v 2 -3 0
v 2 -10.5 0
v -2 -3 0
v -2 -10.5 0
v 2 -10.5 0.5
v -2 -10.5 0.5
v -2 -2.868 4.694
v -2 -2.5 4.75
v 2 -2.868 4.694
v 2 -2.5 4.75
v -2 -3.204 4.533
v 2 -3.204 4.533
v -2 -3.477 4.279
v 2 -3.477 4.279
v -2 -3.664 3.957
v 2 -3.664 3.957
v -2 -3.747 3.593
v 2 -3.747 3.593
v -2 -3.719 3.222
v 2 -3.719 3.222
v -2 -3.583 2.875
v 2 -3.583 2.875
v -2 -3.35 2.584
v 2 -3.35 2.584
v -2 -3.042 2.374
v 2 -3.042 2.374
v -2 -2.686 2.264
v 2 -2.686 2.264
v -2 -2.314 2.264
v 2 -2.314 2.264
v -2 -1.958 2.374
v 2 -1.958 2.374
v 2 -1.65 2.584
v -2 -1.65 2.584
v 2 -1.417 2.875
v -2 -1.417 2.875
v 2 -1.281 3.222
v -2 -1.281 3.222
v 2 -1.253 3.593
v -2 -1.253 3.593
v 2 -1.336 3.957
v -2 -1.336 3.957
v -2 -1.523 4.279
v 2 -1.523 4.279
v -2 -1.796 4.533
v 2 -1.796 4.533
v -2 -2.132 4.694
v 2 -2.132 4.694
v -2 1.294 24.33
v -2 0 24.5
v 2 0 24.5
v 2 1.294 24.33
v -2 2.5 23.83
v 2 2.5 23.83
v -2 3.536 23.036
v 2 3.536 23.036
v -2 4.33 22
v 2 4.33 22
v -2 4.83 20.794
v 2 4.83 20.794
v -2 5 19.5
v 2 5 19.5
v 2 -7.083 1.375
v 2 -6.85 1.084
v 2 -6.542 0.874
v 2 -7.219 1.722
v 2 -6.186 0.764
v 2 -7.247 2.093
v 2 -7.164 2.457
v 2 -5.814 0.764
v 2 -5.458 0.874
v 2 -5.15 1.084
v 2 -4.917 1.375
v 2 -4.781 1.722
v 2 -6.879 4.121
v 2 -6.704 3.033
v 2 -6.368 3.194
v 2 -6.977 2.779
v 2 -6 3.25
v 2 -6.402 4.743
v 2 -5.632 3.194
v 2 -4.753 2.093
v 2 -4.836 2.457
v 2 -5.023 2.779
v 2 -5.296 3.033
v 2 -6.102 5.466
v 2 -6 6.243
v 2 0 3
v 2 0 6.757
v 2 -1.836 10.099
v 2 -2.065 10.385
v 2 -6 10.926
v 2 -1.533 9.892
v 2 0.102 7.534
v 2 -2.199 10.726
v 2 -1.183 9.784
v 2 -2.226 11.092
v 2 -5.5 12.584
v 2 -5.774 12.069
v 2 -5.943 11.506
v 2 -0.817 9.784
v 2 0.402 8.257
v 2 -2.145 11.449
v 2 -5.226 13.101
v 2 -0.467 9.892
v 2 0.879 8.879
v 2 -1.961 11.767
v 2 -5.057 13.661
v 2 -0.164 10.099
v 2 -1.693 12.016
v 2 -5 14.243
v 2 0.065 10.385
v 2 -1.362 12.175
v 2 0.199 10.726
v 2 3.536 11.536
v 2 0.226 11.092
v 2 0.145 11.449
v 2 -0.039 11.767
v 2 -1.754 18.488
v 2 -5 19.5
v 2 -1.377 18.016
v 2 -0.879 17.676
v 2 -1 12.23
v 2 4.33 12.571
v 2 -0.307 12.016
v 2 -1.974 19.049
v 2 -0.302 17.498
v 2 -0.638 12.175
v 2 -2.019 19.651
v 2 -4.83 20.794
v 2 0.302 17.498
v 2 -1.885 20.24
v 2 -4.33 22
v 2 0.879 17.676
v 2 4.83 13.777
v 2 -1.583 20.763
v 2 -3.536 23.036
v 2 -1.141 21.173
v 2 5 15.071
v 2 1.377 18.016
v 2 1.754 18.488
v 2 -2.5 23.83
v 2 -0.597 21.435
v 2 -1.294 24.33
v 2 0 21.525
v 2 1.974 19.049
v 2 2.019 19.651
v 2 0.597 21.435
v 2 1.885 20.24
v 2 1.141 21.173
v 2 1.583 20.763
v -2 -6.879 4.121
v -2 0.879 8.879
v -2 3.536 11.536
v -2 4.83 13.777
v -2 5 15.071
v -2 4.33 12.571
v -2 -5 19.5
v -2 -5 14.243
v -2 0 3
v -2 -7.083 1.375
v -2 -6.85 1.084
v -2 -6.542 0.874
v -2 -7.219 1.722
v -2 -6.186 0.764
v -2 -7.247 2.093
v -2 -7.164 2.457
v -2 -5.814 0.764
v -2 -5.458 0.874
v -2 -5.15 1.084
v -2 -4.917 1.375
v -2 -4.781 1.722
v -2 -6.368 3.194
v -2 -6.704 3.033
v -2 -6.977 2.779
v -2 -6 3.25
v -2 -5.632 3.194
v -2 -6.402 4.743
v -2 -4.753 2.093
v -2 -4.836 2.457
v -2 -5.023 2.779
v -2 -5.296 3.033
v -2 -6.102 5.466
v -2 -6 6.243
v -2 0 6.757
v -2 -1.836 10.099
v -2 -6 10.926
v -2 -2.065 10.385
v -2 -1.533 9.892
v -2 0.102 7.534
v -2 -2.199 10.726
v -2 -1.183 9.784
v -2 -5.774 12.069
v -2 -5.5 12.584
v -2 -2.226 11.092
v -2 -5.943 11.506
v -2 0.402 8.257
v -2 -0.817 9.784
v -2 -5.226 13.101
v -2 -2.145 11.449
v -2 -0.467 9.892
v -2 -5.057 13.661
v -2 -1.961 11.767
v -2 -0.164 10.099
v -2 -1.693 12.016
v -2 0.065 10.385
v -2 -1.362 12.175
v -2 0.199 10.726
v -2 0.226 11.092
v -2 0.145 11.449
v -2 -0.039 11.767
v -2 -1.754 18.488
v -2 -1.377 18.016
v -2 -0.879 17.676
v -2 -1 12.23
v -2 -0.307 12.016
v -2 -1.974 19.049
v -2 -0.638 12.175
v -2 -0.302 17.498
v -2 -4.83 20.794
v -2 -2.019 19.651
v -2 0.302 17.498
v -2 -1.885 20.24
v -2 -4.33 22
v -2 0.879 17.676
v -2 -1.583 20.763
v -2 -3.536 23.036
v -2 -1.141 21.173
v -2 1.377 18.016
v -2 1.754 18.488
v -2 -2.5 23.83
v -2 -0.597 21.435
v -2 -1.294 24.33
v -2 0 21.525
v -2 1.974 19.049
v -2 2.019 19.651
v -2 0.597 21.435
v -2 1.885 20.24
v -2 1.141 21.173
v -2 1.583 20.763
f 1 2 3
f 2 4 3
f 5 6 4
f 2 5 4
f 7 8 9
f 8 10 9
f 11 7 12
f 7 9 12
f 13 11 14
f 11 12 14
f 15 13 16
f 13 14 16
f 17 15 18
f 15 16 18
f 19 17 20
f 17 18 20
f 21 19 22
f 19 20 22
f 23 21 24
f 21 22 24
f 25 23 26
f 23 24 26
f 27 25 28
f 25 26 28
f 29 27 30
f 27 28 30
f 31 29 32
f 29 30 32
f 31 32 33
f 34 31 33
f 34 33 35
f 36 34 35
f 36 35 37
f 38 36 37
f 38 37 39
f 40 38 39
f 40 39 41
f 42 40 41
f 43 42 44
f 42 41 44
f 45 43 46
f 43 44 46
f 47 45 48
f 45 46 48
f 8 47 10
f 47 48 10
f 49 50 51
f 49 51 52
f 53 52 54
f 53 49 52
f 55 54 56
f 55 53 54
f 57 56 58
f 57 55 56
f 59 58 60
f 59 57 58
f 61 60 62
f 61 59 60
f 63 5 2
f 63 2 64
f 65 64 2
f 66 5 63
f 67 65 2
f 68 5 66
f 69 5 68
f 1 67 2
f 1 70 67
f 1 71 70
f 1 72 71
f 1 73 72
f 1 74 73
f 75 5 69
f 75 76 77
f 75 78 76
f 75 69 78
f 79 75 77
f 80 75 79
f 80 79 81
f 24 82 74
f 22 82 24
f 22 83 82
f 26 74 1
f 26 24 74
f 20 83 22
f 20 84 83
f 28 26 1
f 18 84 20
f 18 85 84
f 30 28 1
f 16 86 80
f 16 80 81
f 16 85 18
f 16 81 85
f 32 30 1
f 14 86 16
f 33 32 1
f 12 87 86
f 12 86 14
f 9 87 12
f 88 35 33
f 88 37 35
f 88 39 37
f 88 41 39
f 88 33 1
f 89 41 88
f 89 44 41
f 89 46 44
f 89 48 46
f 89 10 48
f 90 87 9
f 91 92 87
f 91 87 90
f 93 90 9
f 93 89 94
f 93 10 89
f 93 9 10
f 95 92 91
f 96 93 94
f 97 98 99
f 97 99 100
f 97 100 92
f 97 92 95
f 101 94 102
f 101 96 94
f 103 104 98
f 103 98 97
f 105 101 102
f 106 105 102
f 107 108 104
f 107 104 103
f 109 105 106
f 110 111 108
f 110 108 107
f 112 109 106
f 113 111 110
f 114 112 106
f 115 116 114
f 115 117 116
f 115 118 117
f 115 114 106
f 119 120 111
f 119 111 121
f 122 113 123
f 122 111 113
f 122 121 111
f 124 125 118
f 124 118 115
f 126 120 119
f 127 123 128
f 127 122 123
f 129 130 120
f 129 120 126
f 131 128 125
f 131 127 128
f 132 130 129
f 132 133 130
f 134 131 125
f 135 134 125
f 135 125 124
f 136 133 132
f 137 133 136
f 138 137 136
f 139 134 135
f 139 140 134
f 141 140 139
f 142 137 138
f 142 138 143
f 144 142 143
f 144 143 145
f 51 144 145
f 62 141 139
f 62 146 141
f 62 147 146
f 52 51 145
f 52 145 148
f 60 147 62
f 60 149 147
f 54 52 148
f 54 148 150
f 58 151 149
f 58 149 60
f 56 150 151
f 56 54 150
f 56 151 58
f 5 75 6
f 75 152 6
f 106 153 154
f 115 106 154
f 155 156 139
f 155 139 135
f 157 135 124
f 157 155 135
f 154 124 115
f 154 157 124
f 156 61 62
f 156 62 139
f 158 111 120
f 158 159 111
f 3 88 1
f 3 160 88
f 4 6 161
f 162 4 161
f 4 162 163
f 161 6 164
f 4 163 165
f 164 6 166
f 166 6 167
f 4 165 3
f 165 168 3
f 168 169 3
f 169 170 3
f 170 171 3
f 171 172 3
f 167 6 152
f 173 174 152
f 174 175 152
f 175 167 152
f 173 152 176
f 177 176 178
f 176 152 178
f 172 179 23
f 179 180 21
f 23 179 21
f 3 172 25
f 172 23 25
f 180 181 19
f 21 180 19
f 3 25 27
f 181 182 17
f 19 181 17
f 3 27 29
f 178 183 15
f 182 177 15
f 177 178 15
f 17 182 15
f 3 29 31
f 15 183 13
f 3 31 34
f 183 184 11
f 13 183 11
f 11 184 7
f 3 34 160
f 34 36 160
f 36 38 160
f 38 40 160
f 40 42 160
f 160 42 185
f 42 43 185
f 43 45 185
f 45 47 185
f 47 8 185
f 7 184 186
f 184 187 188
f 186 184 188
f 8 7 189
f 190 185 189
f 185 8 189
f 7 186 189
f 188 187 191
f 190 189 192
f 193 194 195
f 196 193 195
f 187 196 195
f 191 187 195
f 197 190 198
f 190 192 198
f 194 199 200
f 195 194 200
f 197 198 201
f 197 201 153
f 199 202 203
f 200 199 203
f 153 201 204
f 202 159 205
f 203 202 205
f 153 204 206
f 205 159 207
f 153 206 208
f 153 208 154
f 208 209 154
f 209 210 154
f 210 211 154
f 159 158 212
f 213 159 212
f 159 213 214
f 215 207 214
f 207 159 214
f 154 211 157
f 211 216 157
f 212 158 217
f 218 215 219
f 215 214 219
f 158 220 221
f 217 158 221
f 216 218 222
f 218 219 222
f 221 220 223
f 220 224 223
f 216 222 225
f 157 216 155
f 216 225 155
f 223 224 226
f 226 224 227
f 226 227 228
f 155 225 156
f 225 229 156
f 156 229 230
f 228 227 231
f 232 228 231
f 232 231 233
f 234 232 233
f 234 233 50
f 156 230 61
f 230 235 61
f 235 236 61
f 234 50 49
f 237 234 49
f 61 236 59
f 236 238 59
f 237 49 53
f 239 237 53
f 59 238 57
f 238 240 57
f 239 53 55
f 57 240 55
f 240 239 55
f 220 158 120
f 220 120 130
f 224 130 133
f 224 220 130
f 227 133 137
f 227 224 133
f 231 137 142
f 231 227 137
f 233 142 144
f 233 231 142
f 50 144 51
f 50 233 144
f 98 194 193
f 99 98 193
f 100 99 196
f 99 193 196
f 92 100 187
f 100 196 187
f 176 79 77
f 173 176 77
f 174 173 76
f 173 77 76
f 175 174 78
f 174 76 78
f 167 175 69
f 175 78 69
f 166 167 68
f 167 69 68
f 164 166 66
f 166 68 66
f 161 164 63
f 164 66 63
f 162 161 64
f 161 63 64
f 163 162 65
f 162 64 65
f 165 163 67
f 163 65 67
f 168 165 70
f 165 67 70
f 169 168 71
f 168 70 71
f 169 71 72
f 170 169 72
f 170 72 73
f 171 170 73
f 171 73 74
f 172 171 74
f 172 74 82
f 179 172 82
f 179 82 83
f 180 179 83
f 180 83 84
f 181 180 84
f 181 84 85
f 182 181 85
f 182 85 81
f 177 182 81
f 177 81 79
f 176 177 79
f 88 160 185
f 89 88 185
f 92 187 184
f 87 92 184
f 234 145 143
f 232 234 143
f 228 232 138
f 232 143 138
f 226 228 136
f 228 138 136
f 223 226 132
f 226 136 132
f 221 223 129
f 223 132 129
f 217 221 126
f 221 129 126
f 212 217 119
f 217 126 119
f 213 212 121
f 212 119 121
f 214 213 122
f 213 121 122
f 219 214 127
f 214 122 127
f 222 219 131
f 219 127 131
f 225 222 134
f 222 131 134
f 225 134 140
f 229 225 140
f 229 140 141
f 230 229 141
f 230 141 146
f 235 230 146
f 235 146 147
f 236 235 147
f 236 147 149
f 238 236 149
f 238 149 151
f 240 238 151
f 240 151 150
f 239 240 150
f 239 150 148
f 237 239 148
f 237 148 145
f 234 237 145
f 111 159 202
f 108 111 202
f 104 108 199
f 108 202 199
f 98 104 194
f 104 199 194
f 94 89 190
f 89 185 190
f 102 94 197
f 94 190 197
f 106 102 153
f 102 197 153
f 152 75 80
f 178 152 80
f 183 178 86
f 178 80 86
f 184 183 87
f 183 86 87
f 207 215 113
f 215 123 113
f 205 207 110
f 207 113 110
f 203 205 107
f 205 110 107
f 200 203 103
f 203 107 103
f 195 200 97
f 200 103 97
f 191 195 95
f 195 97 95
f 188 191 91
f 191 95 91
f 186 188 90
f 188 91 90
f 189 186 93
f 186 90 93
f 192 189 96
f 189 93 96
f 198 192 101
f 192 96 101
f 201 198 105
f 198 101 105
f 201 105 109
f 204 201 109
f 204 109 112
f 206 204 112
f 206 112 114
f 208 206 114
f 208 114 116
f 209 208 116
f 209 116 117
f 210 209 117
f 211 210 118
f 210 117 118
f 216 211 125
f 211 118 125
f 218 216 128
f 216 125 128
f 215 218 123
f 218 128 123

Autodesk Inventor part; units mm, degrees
ref_plane "YZ Plane" through (0, 0, 0) normal (1, 0, 0) x (0, 1, 0)
ref_plane "XZ Plane" through (0, 0, 0) normal (0, 1, 0) x (-1, 0, 0)
ref_plane "XY Plane" through (0, 0, 0) normal (0, 0, 1) x (1, 0, 0)
sketch "Skizze1" plane through (0, 0, 0) normal (1, 0, 0) x (0, 1, 0)
  line L0 (-6, 5) -> (-10.5, 0.5)
  line L1 (-10.5, 0) -> (-3, 0)
  line L2 (0, 3) -> (0, 8)
  line L3 (-10.5, 0.5) -> (-10.5, 0)
  line L4 (0, 8) -> (5, 13)
  line L5 (0, 8) -> (0, 19.5) construction
  circle A0 centre (0, 19.5) radius 0.5
  line L6 (-5, 13) -> (-5, 24.5)
  line L7 (-5, 24.5) -> (5, 24.5)
  line L8 (5, 24.5) -> (5, 13)
  line L9 (0, 3) -> (-3, 0)
  line L10 (-5, 13) -> (-6, 12)
  line L11 (-6, 12) -> (-6, 5)
  line L12 (5, 13) -> (-5, 13) construction
  point P0 (0, 0)
  point P1 (0, 0)
  dimension "d67" = 0.5
  dimension "d68" = 10.5
  dimension "d69" = 1
  dimension "d70" = 5
  dimension "d71" = 19.5
  dimension "d72" = 10
  dimension "d73" = 45
  dimension "d74" = 8
  dimension "d75" = 3
  dimension "d76" = 45
  dimension "d77" = 1
extrude "Extrusion1" add sketch "Skizze1" along normal mid plane 4
sketch "Skizze3" plane through (-2, 0, 0) normal (-1, 0, 0) x (0, 0, 1)
  line L0 (0, 8.1) -> (0, -13.6) projected
  circle A0 centre (19.5, 0) radius 0.5 projected
hole "Bohrung1" at (-2, 0, 19.5) direction (1, 0, 0) diameter 4.05 end through all
sketch "Skizze4" plane through (-2, 0, 0) normal (-1, 0, 0) x (0, 0, 1)
  line L0 (-4.9, 0) -> (29.4, 0) projected
  line L1 (0, 8.1) -> (0, -13.6) projected
  point P0 (11, -1)
  dimension "d36" = 1
  dimension "d37" = 11
hole "Bohrung2" at (-2, -1, 11) direction (1, 0, 0) diameter 2.459 end through all thread size "M3x0.5" class "6H" standard "ISO Metric profile"
fillet "Rundung2" radius 5 3 edges at (0, 5, 24.5) (0, -5, 24.5) (0, 5, 13)
fillet "Rundung4" radius 3 4 edges at (0, -5, 13) (0, -6, 12) (0, 0, 8) (0, -6, 5)
sketch "Skizze5" plane through (-2, 0, 0) normal (-1, 0, 0) x (0, 0, 1)
  line L0 (-4.9, 0) -> (29.4, 0) projected
  line L1 (0, 8.1) -> (0, -13.6) projected
  point P0 (0, 0)
  point P1 (3.7, -4)
  dimension "d38" = 4
  dimension "d39" = 3.7
hole "Bohrung3" [suppressed]
sketch "Skizze6" plane through (-2, 0, 0) normal (-1, 0, 0) x (0, 0, 1)
  line L0 (-4.9, 0) -> (29.4, 0) projected
  line L1 (0, 8.1) -> (0, -13.6) projected
  circle A0 centre (3.5, -2.5) radius 1.5 construction
  circle A1 centre (2, -6) radius 1.5 construction
  line L2 (6, 0) -> (6, -6) construction
  line L3 (10.926, -6) -> (6.2426, -6) construction
  point P0 (0, 0)
  dimension "d80" = 3
  dimension "d81" = 3
  dimension "d83" = 6
  dimension "d85" = 1
  dimension "d86" = 1
  dimension "d87" = 1.5
  dimension "d88" = 3.5
hole "Bohrung4" at (-2, -6, 2) at (-2, -2.5, 3.5) direction (1, 0, 0) diameter 2.5 end through all
mirror "Spiegeln1" [suppressed]
properties part number "Chip Schaufel Seite" material "Aluminium 6061"
